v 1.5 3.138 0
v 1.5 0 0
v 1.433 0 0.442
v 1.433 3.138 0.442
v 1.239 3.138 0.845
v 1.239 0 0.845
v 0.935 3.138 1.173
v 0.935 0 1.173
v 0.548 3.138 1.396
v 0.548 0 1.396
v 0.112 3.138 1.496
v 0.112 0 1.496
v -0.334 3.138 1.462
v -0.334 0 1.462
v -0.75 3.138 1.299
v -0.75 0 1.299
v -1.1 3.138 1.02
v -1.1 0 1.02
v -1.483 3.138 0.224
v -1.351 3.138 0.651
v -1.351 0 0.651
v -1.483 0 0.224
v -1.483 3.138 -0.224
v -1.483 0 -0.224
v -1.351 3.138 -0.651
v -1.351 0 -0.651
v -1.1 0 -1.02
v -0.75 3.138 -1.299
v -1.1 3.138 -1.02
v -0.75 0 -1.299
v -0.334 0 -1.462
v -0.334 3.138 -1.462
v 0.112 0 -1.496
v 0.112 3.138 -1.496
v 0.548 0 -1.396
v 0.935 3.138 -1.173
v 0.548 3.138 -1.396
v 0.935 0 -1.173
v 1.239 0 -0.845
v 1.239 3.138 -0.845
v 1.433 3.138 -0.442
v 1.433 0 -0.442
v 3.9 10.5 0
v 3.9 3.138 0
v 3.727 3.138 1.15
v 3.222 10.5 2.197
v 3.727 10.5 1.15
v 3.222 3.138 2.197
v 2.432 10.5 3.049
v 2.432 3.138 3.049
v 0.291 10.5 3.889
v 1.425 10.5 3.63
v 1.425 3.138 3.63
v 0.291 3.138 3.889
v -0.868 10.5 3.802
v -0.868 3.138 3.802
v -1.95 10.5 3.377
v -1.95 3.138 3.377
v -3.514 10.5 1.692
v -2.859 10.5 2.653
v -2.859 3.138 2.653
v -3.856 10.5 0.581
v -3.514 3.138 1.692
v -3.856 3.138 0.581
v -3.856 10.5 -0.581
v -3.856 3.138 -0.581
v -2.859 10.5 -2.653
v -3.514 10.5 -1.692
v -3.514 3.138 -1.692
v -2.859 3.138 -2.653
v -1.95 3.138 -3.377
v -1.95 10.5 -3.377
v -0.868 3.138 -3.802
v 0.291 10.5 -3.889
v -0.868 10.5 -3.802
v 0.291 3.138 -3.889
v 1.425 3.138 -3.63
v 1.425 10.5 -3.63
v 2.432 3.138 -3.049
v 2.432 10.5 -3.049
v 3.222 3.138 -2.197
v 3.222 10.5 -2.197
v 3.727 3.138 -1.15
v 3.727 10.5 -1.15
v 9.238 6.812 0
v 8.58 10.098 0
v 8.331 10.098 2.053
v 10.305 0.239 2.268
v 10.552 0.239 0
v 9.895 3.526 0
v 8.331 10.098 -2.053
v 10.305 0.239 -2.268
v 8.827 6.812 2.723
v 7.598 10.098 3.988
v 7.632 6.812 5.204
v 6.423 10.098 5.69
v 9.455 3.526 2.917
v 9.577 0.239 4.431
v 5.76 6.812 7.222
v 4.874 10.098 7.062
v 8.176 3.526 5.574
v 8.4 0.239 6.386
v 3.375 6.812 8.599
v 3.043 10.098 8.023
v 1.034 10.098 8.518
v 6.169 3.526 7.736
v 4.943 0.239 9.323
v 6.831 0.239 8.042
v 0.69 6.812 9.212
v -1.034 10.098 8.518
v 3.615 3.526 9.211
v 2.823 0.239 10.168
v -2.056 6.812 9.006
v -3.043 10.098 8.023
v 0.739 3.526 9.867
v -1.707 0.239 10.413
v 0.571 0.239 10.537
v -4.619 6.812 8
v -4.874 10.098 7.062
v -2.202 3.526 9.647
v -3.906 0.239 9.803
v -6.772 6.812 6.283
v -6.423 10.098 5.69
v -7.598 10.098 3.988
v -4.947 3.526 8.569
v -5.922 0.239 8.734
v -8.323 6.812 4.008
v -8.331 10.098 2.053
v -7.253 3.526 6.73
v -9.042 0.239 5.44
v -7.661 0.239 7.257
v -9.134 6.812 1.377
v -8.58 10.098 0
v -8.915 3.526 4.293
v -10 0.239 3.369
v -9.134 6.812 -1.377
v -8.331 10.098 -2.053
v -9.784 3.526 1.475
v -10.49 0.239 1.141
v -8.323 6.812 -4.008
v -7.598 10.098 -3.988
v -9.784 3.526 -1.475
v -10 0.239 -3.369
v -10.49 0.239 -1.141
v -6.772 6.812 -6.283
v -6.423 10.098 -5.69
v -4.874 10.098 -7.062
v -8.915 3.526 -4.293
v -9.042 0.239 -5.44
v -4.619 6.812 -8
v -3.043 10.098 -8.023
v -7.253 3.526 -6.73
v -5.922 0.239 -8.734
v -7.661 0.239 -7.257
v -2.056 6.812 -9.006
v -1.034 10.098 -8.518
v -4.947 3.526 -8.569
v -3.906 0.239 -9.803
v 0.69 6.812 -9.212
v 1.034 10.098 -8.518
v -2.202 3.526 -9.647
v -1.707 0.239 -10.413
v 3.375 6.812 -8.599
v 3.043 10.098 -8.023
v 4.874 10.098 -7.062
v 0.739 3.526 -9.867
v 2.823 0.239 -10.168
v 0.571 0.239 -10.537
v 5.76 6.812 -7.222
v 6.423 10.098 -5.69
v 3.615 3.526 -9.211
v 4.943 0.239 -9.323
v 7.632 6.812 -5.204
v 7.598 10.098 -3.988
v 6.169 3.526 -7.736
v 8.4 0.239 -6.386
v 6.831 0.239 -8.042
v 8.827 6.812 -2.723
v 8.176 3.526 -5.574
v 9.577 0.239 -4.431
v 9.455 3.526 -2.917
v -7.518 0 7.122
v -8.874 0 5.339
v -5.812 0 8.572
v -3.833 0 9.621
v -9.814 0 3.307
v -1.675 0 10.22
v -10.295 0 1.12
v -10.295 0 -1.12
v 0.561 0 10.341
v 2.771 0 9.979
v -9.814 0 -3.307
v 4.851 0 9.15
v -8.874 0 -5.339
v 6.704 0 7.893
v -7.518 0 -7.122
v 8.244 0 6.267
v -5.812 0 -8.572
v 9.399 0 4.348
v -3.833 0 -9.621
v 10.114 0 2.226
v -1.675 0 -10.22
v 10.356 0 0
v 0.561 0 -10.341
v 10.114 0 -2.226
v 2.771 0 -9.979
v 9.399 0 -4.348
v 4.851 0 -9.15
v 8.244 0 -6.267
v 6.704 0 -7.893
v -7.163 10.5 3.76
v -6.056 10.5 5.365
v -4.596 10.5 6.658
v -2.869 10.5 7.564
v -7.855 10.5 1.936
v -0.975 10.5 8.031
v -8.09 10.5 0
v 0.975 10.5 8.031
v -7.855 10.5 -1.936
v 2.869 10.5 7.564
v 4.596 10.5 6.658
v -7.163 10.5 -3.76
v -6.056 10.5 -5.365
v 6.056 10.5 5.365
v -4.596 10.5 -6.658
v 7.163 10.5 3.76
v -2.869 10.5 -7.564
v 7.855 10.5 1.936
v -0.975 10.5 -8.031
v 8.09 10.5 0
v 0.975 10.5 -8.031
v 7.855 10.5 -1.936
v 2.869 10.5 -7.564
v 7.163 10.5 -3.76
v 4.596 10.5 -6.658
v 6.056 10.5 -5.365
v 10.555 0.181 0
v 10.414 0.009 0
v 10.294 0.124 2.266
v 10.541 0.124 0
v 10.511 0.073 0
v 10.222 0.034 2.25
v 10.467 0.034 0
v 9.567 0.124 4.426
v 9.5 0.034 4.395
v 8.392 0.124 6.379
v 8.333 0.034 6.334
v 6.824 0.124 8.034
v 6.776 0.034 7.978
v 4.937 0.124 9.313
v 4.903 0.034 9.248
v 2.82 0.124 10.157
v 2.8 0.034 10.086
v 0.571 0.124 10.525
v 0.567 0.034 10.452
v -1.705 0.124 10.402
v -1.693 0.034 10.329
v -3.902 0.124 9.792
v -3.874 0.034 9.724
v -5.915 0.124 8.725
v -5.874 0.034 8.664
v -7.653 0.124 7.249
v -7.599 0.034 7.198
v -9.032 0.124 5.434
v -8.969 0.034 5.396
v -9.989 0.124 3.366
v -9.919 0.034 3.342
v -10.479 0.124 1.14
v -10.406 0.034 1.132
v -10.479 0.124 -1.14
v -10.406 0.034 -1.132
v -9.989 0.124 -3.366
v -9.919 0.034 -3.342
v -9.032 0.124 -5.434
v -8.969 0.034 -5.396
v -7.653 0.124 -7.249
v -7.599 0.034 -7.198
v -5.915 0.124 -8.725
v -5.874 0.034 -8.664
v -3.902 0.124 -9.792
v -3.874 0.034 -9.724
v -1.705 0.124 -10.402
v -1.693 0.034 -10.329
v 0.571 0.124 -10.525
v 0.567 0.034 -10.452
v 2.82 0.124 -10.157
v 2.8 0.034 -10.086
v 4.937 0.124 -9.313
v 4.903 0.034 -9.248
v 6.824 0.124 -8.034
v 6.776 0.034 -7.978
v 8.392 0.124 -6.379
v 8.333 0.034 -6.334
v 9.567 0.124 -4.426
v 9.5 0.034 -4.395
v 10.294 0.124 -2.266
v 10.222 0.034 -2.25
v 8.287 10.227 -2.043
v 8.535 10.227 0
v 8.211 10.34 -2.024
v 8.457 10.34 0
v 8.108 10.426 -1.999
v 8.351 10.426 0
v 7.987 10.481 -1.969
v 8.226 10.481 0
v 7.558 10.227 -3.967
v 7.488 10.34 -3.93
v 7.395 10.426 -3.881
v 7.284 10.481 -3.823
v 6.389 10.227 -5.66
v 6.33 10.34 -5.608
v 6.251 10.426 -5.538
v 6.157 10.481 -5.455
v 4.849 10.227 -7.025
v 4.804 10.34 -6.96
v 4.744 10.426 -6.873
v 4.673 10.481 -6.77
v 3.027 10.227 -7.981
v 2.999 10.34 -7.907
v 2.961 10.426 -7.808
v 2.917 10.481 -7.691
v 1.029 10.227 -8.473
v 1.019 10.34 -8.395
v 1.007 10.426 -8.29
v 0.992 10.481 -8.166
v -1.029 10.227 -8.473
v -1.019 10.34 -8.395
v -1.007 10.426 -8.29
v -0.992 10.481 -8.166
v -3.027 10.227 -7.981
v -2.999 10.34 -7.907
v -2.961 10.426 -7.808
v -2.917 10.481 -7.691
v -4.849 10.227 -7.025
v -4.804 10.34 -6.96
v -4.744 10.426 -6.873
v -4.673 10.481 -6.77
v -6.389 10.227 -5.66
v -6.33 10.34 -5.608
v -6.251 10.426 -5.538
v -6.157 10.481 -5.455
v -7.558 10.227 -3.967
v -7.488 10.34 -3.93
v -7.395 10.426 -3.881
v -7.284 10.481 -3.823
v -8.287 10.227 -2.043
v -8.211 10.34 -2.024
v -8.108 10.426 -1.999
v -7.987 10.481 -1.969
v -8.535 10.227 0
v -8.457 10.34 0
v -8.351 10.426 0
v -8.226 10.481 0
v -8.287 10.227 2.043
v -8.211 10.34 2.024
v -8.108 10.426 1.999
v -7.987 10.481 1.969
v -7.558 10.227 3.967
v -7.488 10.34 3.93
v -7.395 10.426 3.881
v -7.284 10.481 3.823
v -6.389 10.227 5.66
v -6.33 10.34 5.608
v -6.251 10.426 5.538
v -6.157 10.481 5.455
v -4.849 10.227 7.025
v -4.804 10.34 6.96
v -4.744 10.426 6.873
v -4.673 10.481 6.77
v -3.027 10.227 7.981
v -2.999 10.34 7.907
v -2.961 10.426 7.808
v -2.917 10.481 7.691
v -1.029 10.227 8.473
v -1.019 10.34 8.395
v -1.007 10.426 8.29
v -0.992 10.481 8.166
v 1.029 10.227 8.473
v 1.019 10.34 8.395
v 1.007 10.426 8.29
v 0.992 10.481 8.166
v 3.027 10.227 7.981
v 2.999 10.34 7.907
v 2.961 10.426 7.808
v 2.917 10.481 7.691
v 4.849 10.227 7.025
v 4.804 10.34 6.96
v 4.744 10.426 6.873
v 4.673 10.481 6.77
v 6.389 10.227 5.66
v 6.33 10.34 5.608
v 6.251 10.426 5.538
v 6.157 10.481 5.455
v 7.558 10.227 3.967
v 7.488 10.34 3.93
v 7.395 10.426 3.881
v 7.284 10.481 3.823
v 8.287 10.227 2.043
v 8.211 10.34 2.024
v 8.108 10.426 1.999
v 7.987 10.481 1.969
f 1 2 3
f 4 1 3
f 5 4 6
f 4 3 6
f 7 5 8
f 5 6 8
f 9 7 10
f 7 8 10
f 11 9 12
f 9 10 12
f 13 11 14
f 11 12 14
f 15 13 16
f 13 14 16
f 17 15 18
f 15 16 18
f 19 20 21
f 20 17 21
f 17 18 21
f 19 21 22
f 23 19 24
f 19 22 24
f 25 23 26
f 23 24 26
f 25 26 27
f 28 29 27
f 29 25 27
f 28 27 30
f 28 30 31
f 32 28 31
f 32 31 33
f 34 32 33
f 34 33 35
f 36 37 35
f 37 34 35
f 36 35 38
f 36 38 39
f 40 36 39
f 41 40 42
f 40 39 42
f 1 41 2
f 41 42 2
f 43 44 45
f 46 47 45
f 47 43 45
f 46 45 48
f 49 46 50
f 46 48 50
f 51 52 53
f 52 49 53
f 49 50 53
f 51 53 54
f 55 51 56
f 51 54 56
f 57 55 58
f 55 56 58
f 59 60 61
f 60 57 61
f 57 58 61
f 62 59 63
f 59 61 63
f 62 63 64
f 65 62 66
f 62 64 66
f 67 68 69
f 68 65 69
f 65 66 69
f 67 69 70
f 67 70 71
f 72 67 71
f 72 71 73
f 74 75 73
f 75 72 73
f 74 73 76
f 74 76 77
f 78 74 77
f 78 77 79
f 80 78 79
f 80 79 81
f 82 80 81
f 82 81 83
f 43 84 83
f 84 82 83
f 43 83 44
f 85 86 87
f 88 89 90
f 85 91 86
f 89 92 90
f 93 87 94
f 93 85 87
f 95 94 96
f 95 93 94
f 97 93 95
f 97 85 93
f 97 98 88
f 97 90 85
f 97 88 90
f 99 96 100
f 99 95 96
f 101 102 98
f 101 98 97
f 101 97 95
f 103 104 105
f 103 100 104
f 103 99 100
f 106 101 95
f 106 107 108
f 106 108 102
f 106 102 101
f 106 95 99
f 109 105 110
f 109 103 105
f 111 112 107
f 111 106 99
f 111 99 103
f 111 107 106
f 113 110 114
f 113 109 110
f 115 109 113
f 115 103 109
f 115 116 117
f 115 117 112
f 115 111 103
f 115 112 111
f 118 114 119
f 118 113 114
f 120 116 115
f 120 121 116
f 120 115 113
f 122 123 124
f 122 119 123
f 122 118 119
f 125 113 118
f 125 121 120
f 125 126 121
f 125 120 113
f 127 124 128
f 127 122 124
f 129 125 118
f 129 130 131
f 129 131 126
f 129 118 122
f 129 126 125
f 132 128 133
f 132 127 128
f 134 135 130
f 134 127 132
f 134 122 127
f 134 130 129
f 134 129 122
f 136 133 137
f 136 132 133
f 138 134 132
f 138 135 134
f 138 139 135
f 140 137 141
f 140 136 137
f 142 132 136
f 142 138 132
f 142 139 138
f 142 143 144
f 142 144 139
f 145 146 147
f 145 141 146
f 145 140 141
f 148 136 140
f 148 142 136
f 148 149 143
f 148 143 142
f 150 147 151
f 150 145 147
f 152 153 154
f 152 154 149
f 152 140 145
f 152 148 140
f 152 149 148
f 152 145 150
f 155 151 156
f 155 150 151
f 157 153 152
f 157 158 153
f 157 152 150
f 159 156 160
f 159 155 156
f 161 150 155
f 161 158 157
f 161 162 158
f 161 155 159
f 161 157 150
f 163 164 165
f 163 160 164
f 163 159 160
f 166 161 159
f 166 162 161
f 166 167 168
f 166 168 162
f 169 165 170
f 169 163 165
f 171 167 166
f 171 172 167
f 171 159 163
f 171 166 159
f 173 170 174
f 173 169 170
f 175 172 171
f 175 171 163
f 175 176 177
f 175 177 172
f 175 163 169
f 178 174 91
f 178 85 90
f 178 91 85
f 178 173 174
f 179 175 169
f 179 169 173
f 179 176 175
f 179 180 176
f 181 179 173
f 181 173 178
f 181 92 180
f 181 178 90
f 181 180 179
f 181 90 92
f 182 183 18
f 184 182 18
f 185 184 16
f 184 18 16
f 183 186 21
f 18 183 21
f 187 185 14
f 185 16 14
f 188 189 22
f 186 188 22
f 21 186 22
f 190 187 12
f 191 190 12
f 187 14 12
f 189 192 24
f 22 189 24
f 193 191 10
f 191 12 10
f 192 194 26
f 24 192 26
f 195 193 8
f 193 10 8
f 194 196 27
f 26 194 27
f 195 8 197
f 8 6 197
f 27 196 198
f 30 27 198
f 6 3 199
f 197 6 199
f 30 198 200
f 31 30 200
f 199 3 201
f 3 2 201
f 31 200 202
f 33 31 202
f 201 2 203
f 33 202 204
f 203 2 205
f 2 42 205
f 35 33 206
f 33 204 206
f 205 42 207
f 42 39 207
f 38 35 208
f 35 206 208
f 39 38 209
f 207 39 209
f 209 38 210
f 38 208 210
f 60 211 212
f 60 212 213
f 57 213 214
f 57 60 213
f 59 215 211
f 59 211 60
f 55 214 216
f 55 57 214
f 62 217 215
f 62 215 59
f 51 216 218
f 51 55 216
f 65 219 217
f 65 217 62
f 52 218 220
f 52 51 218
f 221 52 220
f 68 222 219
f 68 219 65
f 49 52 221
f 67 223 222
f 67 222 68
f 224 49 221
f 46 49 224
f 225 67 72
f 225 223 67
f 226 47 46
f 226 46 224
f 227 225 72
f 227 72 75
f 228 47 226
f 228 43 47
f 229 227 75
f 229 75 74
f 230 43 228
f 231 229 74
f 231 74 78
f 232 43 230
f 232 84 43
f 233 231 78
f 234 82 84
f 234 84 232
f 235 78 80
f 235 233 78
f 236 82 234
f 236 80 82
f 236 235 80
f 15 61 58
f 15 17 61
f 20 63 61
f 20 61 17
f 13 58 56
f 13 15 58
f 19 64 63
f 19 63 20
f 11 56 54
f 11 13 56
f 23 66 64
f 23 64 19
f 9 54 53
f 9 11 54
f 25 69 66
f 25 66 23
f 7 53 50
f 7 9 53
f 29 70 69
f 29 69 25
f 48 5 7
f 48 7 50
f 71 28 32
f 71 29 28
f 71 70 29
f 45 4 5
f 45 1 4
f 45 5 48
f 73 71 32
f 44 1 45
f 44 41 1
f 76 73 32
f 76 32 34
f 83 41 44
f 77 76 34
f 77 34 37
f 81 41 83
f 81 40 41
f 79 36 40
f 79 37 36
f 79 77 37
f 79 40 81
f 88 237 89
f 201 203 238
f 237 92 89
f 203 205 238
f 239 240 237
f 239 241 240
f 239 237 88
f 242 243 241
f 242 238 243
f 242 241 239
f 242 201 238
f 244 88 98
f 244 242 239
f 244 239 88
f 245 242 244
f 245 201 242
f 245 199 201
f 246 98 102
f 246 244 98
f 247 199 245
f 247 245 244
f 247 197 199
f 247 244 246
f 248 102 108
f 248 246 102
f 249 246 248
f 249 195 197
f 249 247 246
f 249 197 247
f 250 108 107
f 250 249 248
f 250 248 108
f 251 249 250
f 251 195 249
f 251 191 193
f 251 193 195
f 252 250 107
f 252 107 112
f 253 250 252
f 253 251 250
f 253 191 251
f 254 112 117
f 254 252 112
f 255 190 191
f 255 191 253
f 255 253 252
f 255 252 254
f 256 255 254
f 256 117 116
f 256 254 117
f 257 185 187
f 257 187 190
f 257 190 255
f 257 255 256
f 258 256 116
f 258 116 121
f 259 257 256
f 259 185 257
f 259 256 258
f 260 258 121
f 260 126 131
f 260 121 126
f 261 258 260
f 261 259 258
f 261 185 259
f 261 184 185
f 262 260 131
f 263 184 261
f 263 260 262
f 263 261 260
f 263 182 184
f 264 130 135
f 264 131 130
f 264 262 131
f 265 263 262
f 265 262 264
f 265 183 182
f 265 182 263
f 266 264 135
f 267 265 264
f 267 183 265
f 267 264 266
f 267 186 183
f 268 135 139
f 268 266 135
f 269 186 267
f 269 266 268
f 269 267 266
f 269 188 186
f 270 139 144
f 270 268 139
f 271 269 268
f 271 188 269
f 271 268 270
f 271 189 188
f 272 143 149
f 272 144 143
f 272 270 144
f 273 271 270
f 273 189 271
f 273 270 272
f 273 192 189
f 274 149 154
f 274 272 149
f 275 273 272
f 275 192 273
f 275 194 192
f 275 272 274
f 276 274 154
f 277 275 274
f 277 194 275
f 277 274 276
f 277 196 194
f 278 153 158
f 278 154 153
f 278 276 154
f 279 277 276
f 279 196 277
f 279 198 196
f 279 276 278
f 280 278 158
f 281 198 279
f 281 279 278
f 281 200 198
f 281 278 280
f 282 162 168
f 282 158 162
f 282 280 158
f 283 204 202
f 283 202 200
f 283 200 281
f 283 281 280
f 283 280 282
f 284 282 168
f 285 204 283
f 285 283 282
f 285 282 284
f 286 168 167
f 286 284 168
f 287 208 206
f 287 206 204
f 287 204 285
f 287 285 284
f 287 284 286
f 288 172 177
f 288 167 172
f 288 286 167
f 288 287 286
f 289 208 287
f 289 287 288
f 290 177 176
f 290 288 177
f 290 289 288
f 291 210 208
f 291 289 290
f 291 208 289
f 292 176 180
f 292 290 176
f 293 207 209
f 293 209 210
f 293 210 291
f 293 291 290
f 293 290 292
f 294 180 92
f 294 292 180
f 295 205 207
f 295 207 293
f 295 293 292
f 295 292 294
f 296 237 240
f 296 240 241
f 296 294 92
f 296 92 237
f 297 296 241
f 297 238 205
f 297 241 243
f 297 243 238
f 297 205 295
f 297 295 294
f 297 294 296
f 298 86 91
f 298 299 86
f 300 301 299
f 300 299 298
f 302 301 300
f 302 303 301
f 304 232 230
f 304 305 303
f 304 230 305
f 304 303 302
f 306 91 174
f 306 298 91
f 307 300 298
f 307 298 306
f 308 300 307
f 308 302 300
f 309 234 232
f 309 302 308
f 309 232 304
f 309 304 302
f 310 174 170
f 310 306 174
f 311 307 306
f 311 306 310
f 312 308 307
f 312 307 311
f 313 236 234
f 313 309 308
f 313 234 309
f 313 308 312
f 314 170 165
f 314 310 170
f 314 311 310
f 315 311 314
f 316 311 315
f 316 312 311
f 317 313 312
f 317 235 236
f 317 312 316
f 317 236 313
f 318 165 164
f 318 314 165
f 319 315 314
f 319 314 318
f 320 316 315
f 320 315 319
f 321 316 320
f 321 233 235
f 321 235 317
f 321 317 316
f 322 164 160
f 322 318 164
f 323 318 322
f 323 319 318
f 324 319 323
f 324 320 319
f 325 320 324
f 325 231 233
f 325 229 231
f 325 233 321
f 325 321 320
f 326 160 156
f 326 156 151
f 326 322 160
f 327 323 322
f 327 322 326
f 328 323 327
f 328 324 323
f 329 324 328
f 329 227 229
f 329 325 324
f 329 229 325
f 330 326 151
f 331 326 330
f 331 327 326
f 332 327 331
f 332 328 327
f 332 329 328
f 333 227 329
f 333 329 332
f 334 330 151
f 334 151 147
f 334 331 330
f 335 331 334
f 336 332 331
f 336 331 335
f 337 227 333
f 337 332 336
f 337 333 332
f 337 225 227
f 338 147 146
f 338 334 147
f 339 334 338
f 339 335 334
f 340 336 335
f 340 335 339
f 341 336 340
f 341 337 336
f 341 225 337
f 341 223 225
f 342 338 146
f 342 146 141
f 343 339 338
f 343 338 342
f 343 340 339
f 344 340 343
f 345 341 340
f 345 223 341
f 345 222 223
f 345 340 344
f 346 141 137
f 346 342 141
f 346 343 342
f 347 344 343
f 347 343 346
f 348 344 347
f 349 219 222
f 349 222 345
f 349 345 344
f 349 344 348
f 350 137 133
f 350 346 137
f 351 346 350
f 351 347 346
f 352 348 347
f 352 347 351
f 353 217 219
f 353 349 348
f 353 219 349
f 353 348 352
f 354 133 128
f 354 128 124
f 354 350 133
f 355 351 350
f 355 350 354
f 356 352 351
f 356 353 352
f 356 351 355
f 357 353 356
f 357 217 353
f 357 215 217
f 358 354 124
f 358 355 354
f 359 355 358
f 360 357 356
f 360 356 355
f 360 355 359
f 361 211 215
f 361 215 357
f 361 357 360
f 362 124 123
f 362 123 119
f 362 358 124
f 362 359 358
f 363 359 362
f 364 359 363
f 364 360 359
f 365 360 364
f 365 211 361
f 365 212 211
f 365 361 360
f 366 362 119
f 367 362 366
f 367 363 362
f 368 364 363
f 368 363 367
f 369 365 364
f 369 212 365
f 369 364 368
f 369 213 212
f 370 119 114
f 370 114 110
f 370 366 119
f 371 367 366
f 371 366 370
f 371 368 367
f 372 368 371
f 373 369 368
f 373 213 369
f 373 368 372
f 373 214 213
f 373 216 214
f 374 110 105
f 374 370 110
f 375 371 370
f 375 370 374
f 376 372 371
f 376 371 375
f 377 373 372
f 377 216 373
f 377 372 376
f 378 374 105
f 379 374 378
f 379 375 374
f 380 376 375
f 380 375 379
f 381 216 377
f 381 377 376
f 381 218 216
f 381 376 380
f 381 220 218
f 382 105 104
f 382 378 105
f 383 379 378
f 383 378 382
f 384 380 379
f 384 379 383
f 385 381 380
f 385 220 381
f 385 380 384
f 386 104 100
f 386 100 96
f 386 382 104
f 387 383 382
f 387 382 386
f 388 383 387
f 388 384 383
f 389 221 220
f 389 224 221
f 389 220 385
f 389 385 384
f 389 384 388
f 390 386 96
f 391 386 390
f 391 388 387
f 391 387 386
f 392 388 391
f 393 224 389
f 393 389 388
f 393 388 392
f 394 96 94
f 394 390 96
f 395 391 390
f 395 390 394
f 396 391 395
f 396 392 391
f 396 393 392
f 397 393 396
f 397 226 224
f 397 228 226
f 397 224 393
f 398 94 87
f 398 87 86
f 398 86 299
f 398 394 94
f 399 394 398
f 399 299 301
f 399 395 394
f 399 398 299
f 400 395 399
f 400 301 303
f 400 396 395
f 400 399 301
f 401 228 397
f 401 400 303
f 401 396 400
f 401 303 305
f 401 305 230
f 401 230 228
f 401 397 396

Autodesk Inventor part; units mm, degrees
ref_plane "YZ Plane" through (0, 0, 0) normal (1, 0, 0) x (0, 1, 0)
ref_plane "XZ Plane" through (0, 0, 0) normal (0, 1, 0) x (-1, 0, 0)
ref_plane "XY Plane" through (0, 0, 0) normal (0, 0, 1) x (1, 0, 0)
sketch "Эскиз1" plane through (0, 0, 0) normal (0, 0, 1) x (1, 0, 0)
  line L0 (0, 0) -> (0, 10.5)
  line L1 (3.9, 10.5) -> (8.5, 10.5)
  line L2 (8.5, 10.5) -> (10.6, 0)
  line L3 (0, 0) -> (10.6, 0)
  line L4 (3.9, 10.5) -> (3.9, 3.1378)
  line L5 (3.9, 3.1378) -> (1.5, 3.1378)
  line L6 (1.5, 3.1378) -> (1.5, 0)
  dimension "d0" = 10.5
  dimension "d1" = 3
  dimension "d2" = 7.8
  dimension "d3" = 17
  dimension "d4" = 21.2
revolve "Вращение1" add sketch "Эскиз1" angle 360 about axis through (0, 0, 0) along (0, 1, 0)
fillet "Сопряжение1" radius 0.2 1 edges at (-10.6, 0, 0)
fillet "Сопряжение2" radius 0.5 1 edges at (-8.5, 10.5, 0)
properties part number "ножки"
